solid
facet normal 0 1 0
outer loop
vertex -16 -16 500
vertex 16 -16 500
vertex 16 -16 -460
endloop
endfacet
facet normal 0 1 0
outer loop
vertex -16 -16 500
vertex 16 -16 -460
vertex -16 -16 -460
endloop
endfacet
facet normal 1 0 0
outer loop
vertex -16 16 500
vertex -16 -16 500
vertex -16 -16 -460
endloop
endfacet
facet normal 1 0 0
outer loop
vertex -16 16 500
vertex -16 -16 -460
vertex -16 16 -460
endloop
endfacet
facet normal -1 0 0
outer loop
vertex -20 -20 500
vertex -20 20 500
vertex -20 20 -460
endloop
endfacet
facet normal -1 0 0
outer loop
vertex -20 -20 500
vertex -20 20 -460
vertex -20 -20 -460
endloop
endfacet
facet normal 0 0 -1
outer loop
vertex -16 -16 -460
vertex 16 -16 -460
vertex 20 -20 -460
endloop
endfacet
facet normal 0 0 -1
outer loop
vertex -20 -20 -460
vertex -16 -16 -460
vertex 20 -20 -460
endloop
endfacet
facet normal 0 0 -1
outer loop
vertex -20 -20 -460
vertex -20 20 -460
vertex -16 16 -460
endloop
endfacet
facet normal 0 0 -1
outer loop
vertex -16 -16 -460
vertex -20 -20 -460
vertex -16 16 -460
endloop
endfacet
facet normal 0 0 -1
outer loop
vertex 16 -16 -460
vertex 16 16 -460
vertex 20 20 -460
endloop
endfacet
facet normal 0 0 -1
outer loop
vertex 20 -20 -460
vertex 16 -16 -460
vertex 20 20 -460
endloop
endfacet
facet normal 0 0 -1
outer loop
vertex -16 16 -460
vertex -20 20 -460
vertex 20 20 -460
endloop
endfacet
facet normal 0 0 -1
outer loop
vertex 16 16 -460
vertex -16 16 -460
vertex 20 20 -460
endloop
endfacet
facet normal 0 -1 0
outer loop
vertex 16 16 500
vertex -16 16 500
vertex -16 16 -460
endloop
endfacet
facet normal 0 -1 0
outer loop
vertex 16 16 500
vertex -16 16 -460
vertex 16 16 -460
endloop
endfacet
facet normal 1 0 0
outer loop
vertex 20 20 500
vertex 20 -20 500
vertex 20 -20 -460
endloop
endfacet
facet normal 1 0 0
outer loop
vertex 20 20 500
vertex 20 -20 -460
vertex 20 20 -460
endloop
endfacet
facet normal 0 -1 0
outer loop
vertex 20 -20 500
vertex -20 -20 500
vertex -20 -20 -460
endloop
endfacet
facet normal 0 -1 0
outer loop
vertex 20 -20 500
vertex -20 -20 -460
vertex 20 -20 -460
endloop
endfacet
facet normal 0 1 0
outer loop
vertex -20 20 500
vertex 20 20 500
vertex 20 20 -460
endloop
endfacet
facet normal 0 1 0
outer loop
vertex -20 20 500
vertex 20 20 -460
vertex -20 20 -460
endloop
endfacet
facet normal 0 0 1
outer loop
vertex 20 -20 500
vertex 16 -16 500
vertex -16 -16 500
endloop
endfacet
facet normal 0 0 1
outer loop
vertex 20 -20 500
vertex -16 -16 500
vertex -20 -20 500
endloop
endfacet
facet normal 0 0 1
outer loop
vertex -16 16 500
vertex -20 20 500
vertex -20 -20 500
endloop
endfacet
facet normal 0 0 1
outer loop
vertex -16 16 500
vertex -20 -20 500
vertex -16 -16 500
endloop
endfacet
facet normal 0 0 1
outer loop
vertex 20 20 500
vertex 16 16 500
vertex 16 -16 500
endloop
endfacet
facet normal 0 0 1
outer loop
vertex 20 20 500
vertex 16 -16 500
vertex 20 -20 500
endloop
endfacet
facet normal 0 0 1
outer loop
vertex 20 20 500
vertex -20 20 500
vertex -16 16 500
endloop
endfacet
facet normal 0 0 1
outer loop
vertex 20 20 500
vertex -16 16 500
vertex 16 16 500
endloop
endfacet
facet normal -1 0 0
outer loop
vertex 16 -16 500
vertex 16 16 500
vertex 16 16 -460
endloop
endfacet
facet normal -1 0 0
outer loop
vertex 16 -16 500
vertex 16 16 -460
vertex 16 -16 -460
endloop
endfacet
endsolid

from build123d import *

# Parameters (mm, degrees)
SKETCH1_W   = 40
SKETCH1_H   = 40
SKETCH1_W_2 = 32
SKETCH1_H_2 = 32


with BuildPart() as part:
    # Sweep1: sweep along a curve in space
    with BuildLine() as sweep1_path:
        add(Edge.make_bspline(
            [(0, 0, -460), (0, 0, 500)],
            knots=[0, 0, 1, 1], degree=1))
    # Sketch1 → Sweep1 (sweep)
    with BuildSketch(Plane.XY):
        Rectangle(SKETCH1_W, SKETCH1_H)
        Rectangle(SKETCH1_W_2, SKETCH1_H_2, mode=Mode.SUBTRACT)
    sweep(path=sweep1_path.line)


solid = part.part
